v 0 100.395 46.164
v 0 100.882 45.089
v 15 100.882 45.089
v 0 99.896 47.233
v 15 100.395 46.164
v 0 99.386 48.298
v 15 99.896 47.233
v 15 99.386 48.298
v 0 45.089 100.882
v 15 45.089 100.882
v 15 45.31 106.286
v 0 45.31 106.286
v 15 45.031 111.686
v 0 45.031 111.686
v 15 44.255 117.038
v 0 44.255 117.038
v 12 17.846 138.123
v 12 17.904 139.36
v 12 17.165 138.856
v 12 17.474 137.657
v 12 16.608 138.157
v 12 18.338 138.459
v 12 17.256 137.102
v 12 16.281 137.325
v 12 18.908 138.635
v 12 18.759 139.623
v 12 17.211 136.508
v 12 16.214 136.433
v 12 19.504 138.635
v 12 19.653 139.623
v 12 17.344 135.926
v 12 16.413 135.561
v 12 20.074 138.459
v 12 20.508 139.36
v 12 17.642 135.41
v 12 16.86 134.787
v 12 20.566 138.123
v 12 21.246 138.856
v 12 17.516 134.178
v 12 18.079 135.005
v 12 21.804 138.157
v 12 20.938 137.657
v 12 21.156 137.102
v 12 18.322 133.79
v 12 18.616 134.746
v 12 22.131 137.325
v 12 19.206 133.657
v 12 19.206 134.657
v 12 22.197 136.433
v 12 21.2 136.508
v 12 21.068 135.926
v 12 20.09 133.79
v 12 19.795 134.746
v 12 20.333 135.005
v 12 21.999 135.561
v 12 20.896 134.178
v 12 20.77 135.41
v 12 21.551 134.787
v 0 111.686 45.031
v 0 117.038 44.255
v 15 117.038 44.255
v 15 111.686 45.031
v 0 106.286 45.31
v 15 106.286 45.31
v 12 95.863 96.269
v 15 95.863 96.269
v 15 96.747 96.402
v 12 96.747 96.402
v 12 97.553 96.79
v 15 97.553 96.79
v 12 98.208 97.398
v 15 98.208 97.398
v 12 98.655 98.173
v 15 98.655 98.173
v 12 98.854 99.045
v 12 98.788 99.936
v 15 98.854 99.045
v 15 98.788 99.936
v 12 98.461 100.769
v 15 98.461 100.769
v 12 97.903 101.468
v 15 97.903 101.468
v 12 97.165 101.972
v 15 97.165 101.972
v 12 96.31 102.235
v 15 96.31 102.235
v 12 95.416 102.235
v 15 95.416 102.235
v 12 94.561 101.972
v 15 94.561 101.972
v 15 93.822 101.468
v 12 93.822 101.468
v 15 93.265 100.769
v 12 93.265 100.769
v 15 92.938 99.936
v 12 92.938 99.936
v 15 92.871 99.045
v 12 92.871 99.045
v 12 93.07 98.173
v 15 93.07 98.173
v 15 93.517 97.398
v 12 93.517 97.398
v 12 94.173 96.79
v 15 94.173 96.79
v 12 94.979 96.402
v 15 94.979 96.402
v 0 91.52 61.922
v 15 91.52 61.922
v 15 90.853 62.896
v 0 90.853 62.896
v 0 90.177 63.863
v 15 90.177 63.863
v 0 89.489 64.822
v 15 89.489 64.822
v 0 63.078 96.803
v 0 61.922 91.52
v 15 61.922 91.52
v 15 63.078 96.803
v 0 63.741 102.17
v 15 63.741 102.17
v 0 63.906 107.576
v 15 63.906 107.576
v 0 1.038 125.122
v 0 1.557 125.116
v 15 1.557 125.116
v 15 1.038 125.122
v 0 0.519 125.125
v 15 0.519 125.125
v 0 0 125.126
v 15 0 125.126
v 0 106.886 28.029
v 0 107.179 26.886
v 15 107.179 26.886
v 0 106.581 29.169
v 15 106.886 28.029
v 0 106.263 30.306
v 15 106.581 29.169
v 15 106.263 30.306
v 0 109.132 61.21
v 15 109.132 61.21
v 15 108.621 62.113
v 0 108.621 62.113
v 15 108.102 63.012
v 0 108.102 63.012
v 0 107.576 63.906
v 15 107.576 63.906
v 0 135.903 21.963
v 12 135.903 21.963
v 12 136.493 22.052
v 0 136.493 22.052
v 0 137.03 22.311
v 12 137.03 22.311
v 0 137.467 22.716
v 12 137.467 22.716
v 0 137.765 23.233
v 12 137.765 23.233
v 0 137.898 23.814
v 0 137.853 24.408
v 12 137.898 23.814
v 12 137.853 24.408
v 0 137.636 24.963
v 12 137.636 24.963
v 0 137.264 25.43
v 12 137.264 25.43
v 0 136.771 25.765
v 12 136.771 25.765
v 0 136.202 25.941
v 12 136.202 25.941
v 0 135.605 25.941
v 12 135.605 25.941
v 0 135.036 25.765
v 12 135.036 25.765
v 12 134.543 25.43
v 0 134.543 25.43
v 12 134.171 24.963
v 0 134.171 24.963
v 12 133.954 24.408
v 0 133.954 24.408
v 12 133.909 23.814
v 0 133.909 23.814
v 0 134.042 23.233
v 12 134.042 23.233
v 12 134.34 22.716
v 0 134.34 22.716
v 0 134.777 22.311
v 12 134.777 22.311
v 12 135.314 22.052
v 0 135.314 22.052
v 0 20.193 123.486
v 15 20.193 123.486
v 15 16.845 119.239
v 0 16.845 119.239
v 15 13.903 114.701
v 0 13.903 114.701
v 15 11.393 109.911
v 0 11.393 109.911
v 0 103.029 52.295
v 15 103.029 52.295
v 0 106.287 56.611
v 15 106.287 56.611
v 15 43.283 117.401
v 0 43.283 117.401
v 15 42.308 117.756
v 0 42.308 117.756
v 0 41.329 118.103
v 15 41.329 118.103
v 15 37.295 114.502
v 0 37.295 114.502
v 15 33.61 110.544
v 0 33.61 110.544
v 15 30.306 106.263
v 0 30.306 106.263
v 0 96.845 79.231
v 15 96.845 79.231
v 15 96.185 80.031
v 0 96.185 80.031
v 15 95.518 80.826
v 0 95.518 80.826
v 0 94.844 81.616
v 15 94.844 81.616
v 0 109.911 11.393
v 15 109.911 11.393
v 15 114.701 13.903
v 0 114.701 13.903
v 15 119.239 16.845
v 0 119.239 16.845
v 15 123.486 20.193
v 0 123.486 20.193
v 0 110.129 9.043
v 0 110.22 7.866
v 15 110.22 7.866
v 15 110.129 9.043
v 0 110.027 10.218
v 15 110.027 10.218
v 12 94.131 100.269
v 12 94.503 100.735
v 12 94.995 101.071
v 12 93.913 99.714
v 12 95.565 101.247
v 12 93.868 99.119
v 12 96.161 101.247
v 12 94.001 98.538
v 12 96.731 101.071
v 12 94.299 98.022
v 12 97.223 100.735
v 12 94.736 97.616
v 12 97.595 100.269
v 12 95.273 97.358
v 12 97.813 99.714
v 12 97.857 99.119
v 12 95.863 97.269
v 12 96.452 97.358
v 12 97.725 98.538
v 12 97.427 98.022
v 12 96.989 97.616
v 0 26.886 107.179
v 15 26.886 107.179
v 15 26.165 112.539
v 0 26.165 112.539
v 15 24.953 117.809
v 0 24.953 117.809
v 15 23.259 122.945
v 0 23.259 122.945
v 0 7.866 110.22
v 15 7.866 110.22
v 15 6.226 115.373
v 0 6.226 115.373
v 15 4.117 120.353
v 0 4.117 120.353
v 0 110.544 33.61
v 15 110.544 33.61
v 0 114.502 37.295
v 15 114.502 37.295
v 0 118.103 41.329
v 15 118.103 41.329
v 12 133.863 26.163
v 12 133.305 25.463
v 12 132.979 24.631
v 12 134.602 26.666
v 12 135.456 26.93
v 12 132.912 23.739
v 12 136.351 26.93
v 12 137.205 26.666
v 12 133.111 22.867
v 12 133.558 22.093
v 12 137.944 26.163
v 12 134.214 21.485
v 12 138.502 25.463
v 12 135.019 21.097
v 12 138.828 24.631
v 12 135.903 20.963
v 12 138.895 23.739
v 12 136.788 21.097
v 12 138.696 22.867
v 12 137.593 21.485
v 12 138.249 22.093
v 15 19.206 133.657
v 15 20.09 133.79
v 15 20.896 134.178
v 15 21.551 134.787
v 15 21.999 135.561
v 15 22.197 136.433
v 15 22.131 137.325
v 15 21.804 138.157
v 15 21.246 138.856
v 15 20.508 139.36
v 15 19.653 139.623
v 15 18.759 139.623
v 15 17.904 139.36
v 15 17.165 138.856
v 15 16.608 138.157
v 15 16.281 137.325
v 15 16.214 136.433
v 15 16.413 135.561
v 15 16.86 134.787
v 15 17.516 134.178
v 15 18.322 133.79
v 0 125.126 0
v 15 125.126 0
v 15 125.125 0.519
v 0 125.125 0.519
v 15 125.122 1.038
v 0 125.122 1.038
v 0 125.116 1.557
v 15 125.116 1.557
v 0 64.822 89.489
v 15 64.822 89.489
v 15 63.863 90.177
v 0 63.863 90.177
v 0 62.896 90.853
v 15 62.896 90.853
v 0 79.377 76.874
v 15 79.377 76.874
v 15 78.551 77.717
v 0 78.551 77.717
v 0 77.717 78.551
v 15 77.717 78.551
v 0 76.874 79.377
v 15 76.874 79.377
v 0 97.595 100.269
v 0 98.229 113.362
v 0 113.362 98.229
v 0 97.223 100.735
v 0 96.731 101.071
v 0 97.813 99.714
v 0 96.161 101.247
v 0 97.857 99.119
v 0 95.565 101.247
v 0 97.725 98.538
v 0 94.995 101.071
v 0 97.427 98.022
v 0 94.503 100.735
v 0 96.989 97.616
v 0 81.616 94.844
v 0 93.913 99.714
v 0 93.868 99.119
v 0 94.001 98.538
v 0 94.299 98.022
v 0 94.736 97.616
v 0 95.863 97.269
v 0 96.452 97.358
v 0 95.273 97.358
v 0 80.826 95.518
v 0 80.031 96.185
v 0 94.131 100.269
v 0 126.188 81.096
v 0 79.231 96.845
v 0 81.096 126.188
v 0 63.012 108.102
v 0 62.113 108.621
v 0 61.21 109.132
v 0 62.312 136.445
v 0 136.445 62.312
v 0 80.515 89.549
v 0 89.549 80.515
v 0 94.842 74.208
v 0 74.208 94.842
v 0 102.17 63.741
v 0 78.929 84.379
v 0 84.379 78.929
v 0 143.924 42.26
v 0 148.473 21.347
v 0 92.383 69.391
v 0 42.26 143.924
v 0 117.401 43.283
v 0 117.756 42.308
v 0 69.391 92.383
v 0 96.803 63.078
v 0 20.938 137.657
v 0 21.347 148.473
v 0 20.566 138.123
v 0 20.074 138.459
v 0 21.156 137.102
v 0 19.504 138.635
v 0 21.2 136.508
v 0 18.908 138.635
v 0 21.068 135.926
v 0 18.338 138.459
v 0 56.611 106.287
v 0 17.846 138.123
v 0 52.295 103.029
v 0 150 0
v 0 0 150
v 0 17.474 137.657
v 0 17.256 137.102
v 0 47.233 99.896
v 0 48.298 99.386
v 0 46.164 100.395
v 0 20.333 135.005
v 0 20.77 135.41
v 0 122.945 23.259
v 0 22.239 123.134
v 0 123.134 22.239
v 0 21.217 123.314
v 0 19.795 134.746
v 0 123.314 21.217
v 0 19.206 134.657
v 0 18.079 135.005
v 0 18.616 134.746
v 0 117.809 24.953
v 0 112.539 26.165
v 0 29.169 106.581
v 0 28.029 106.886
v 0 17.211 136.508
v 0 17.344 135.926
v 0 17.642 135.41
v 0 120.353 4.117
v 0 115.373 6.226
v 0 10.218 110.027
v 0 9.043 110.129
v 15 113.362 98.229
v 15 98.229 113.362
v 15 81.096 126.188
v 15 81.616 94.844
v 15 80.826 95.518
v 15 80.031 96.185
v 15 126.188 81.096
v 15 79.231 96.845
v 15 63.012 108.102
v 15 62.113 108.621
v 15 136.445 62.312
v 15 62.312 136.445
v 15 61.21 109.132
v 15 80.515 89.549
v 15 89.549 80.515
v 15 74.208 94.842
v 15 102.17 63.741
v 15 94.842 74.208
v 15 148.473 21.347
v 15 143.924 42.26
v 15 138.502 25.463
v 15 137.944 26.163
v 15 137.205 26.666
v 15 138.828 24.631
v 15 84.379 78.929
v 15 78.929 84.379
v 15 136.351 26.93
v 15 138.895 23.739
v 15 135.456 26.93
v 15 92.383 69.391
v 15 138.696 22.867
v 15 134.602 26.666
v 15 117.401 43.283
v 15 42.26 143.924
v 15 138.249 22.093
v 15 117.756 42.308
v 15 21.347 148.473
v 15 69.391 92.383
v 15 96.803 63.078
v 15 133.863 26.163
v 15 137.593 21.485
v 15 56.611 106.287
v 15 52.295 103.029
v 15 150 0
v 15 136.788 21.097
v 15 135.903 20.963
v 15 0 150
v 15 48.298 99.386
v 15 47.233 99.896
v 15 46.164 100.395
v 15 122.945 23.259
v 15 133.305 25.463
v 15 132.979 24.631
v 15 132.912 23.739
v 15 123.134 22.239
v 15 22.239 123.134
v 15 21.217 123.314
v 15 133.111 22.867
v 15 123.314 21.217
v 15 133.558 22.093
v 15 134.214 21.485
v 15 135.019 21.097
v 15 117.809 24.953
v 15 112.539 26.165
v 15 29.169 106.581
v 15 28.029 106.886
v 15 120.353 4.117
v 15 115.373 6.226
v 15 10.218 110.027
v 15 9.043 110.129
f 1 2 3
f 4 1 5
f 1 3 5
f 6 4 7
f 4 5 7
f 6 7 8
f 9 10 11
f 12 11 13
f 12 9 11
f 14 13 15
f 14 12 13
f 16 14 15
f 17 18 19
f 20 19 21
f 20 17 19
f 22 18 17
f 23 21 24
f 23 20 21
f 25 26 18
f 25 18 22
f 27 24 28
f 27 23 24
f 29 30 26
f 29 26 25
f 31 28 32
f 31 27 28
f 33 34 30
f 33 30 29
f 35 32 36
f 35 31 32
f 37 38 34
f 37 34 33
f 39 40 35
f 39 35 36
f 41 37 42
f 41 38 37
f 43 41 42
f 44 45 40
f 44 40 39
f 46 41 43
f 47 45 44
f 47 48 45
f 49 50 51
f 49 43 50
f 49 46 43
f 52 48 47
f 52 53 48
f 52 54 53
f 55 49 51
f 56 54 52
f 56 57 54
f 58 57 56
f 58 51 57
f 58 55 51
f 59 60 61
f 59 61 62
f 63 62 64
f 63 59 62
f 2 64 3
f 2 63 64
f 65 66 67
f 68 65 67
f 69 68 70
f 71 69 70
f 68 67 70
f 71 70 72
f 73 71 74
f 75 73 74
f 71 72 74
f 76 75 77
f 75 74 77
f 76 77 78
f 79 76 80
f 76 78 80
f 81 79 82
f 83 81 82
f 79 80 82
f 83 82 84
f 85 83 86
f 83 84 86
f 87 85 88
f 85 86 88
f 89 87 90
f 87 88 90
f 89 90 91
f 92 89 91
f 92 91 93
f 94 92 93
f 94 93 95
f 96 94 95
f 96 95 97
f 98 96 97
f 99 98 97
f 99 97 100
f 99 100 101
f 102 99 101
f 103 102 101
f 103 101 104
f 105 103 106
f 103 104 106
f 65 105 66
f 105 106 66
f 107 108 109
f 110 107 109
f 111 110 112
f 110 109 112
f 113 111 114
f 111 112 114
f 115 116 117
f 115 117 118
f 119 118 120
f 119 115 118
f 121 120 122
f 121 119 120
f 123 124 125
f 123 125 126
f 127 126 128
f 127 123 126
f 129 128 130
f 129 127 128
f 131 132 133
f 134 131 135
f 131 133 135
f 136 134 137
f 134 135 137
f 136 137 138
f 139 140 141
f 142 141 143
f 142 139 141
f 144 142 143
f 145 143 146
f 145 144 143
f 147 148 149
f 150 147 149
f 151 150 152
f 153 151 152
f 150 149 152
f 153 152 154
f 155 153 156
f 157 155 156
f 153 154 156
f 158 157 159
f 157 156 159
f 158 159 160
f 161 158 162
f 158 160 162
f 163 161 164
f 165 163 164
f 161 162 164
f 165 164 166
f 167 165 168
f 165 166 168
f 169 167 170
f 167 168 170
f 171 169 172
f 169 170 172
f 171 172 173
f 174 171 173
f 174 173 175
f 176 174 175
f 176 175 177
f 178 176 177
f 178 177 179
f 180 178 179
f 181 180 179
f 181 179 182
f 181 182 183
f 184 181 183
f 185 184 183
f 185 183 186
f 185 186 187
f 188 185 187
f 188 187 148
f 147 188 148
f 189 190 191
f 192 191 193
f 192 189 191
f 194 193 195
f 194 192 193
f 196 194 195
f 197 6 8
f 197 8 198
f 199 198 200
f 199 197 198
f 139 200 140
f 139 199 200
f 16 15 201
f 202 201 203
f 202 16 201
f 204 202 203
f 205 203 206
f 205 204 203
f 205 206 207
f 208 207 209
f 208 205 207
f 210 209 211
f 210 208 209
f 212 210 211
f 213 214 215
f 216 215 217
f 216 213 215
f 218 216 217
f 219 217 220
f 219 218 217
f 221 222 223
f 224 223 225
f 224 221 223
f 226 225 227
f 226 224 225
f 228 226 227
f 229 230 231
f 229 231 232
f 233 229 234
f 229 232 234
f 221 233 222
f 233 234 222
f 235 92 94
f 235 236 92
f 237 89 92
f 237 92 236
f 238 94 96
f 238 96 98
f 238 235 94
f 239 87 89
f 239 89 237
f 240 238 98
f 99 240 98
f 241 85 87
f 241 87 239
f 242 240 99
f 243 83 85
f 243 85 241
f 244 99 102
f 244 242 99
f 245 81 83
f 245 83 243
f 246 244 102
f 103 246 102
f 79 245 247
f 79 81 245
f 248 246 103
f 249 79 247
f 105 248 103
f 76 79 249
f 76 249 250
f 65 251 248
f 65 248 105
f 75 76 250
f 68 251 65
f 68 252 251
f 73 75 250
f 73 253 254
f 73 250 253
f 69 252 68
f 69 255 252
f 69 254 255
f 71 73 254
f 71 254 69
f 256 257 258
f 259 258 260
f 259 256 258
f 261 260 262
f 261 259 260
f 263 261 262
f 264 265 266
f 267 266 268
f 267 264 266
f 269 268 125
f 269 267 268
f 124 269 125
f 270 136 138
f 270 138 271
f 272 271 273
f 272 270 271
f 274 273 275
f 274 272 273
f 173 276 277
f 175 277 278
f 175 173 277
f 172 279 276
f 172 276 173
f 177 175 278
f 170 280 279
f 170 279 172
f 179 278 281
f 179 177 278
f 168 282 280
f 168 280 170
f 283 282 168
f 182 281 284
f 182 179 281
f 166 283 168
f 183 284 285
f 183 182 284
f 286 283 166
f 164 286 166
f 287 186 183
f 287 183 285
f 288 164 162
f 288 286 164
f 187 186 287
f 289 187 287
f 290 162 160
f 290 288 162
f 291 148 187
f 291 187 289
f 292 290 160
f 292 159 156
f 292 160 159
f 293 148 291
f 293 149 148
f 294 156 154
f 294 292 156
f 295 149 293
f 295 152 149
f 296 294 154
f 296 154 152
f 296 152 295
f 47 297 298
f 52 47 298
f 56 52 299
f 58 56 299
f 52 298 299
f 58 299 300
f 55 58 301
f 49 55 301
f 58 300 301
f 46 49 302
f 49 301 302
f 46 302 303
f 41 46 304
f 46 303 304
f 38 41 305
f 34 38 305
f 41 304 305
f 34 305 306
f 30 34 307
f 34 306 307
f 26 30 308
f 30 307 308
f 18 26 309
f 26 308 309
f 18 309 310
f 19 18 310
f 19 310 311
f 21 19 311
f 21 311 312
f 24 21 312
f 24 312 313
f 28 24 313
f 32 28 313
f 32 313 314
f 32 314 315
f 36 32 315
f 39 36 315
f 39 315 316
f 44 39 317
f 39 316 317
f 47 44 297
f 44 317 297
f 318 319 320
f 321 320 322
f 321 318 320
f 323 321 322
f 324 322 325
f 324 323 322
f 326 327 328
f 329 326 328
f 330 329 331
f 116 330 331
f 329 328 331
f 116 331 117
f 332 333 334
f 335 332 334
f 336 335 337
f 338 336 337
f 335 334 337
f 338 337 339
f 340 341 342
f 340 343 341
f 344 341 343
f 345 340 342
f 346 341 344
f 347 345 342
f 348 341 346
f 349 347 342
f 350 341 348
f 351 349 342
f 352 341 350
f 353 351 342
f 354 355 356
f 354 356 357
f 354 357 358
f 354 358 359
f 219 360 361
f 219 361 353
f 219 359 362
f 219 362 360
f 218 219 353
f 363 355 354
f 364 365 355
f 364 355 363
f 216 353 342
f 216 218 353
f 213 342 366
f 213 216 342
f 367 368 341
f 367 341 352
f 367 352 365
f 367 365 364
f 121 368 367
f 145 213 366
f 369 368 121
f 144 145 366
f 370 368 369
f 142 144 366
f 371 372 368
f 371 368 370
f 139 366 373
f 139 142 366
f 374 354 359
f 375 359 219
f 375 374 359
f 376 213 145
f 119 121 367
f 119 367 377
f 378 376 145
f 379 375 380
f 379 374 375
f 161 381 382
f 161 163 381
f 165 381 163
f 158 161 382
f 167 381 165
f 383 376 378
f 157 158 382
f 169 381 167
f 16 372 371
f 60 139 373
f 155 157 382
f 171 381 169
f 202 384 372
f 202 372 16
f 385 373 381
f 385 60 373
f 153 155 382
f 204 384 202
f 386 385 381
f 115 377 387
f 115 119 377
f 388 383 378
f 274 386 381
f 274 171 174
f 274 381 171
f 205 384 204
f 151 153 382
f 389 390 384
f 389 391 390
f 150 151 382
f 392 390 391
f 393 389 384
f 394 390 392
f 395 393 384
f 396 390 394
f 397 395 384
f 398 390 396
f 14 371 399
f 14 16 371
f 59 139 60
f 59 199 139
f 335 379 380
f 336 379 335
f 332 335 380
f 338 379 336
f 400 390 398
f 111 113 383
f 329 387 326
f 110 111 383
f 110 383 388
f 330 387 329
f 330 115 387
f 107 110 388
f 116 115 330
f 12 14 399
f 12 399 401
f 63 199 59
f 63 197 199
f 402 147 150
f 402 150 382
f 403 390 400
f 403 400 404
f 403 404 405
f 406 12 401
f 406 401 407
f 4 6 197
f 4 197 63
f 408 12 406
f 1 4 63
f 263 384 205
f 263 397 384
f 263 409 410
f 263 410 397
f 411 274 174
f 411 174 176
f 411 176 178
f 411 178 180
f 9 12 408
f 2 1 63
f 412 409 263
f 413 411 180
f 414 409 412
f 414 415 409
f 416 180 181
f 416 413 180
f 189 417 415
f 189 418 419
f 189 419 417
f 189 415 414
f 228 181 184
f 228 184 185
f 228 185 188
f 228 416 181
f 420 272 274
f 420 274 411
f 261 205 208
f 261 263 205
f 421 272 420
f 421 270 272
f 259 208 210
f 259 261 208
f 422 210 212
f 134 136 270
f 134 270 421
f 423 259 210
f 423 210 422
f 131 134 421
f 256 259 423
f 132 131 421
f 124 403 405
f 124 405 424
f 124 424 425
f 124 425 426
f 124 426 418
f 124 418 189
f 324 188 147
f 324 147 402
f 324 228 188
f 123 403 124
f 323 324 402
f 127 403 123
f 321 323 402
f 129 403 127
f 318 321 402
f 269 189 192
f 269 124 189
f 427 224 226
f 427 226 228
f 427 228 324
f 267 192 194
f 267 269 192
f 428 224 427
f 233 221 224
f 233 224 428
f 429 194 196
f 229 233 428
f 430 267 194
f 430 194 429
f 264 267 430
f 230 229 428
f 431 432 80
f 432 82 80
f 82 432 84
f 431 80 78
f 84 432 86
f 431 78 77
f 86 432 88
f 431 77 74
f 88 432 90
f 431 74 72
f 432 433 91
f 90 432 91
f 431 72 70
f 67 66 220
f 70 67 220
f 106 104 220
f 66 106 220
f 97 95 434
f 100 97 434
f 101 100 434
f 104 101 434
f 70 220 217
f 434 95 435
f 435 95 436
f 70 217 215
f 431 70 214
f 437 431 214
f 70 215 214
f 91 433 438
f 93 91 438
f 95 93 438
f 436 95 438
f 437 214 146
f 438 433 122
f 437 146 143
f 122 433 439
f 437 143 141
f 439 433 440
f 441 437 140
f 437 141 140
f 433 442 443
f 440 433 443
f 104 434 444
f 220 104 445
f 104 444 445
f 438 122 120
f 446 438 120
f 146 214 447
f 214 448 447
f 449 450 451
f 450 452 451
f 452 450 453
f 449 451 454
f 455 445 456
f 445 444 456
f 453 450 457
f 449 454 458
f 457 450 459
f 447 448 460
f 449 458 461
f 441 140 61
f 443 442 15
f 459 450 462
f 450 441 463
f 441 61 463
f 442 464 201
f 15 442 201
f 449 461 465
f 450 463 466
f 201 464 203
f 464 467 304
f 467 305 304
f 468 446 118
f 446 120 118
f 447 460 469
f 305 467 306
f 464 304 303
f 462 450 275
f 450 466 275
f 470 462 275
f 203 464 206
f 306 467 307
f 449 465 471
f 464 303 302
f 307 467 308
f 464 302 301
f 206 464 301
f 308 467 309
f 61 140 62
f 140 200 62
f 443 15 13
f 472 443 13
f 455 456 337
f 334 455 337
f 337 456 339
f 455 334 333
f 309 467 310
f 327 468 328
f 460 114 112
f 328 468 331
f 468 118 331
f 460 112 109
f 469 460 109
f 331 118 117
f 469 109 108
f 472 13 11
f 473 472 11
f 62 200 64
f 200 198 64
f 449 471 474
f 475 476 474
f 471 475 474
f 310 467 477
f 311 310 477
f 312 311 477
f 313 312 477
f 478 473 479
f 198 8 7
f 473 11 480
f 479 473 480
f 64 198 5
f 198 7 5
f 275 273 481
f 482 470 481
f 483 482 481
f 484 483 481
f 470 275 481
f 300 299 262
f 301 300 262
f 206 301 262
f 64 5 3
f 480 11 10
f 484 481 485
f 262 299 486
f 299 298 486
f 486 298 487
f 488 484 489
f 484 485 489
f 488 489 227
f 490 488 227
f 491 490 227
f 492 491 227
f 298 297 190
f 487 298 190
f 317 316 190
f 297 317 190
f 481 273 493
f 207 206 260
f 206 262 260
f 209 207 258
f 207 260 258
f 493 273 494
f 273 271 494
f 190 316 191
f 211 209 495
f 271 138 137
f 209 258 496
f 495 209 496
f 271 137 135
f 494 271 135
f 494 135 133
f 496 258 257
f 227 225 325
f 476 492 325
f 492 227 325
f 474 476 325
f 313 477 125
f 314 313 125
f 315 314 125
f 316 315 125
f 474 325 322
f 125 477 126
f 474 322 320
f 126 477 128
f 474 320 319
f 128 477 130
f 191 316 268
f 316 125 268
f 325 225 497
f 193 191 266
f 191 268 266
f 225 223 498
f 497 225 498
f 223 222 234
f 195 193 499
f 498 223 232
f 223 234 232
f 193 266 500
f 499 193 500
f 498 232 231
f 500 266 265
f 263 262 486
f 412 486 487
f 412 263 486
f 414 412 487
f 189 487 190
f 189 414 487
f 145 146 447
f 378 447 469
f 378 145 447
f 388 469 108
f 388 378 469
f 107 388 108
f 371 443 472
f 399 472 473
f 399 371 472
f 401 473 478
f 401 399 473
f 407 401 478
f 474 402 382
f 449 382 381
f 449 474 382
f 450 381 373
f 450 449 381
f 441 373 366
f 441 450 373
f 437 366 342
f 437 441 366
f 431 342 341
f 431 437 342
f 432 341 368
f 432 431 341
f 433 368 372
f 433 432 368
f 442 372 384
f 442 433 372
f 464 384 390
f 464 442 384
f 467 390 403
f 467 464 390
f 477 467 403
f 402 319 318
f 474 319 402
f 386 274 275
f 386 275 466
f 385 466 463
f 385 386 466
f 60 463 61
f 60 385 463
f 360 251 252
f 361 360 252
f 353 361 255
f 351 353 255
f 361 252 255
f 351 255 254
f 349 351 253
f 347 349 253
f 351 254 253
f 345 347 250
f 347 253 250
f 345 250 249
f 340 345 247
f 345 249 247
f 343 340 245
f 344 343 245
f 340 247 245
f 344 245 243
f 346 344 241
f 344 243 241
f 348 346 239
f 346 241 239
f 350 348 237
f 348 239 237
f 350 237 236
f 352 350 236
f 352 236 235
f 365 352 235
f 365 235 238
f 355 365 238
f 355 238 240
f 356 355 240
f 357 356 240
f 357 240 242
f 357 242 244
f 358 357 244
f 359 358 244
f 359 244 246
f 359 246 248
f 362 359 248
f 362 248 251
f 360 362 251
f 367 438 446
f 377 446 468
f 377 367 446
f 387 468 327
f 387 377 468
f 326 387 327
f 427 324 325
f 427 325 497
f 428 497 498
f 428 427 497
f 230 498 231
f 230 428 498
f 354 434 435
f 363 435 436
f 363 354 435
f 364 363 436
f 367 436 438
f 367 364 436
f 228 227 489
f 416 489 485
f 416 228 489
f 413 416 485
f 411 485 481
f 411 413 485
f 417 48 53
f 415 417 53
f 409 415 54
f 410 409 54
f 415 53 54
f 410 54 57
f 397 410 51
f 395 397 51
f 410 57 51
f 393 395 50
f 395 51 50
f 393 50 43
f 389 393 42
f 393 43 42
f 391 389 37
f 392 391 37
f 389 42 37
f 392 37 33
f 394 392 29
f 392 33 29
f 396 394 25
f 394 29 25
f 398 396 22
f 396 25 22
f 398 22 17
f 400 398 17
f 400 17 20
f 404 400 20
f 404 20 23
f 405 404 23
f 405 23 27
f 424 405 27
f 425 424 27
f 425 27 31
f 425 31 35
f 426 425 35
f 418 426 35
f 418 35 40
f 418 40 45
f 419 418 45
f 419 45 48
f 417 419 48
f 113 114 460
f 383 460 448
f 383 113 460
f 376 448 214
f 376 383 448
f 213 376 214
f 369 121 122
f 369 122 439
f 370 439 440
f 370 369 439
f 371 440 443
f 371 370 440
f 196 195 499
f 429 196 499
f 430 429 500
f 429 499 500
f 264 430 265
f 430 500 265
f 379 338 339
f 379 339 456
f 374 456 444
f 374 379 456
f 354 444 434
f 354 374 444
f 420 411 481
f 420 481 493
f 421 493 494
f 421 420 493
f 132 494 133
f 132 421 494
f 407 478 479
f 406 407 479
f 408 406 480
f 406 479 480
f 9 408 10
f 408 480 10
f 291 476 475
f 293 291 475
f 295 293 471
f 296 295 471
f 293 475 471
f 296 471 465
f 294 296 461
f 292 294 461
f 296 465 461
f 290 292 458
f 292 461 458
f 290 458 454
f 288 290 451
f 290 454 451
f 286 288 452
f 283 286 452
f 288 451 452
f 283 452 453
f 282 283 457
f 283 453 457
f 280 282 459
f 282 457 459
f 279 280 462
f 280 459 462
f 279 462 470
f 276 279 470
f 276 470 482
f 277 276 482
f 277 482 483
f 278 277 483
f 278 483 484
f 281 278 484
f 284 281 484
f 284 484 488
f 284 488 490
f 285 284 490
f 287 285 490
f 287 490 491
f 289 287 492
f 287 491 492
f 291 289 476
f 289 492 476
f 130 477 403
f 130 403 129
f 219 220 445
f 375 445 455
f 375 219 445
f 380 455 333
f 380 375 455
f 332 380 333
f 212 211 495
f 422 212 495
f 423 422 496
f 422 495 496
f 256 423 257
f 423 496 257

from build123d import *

# Parameters (mm, degrees)
BASPROSKE_W           = 15
BASPROSKE_H           = 39.5
TOOTHCUT_DEPTH        = 213.661703181
TEETHCUTS_COUNT       = 36
TEETHCUTS_ANGLE       = 350
CROQUIS1_OUTSIDE_W    = 386.906
CROQUIS1_OUTSIDE_H    = 386.906
CROQUIS1_OUTSIDE_W_2  = 205.376556513
CROQUIS1_OUTSIDE_H_2  = 174.679952659
CORTAR_EXTRUIR1_DEPTH = 213.661703181
CROQUIS2_R            = 2
CORTAR_EXTRUIR2_DEPTH = 213.661703181
CROQUIS2_3_R          = 3
CROQUIS2_3_R_2        = 2
CORTAR_EXTRUIR3_DEPTH = 3


with BuildPart() as part:
    # BasProSke → Base-Revolve (revolve)
    with BuildSketch(Plane(origin=(0, 0, 0), x_dir=(1, 0, 0), z_dir=(0, 1, 0))):
        with Locations((7.5, 130.25)):
            Rectangle(BASPROSKE_W, BASPROSKE_H)
    revolve(axis=Axis((-10, 0, 0), (1, 0, 0)))

    # TooCutSke → ToothCut (cut, through all)
    with BuildSketch(Plane(origin=(0, 0, 0), x_dir=(0, 0, -1), z_dir=(1, 0, 0))):
        with BuildLine():
            ThreePointArc((7.872935628, 110.193711843), (5.234019781, 117.874768587), (1.556724153, 125.116315826))
            ThreePointArc((1.556724153, 125.116315826), (0, 125.126), (-1.556724153, 125.116315826))
            ThreePointArc((-1.556724153, 125.116315826), (-5.234019781, 117.874768587), (-7.872935628, 110.193711843))
            ThreePointArc((-7.872935628, 110.193711843), (0, 110.4746), (7.872935628, 110.193711843))
        make_face()
    toothcut = extrude(amount=TOOTHCUT_DEPTH, mode=Mode.SUBTRACT)

    # TeethCuts: ToothCut ×36 about axis
    teethcuts_axis = Axis((-10, 0, 0), (1, 0, 0))
    for i in range(1, TEETHCUTS_COUNT):
        add(toothcut.rotate(teethcuts_axis, i * TEETHCUTS_ANGLE / (TEETHCUTS_COUNT - 1)), mode=Mode.SUBTRACT)

    # Croquis1 outside → Cortar-Extruir1 (cut, through all)
    with BuildSketch(Plane(origin=(15, 0, 0), x_dir=(0, 0, -1), z_dir=(1, 0, 0))):
        Rectangle(CROQUIS1_OUTSIDE_W, CROQUIS1_OUTSIDE_H)
        with Locations((-102.688278257, 87.33997633)):
            Rectangle(CROQUIS1_OUTSIDE_W_2, CROQUIS1_OUTSIDE_H_2, mode=Mode.SUBTRACT)
    extrude(amount=-CORTAR_EXTRUIR1_DEPTH, mode=Mode.SUBTRACT)

    # Croquis2 → Cortar-Extruir2 (cut, through all)
    with BuildSketch(Plane(origin=(15, 0, 0), x_dir=(0, 0, -1), z_dir=(1, 0, 0))):
        with Locations((-23.963448518, 135.903469916)):
            Circle(CROQUIS2_R)
        with Locations((-99.268892447, 95.862855123)):
            Circle(CROQUIS2_R)
        with Locations((-136.656993486, 19.205887932)):
            Circle(CROQUIS2_R)
    extrude(amount=-CORTAR_EXTRUIR2_DEPTH, mode=Mode.SUBTRACT)

    # Croquis2<3> → Cortar-Extruir3 (cut)
    # profile 1 of 3: a face of its own
    with BuildSketch(Plane(origin=(15, 0, 0), x_dir=(0, 0, -1), z_dir=(1, 0, 0))):
        with Locations((-23.963448518, 135.903469916)):
            Circle(CROQUIS2_3_R)
        with Locations((-23.963448518, 135.903469916)):
            Circle(CROQUIS2_3_R_2, mode=Mode.SUBTRACT)
    # profile 2 of 3: a face of its own
    with BuildSketch(Plane(origin=(15, 0, 0), x_dir=(0, 0, -1), z_dir=(1, 0, 0))):
        with Locations((-99.268892447, 95.862855123)):
            Circle(CROQUIS2_3_R)
        with Locations((-99.268892447, 95.862855123)):
            Circle(CROQUIS2_3_R_2, mode=Mode.SUBTRACT)
    # profile 3 of 3: a face of its own
    with BuildSketch(Plane(origin=(15, 0, 0), x_dir=(0, 0, -1), z_dir=(1, 0, 0))):
        with Locations((-136.656993486, 19.205887932)):
            Circle(CROQUIS2_3_R)
        with Locations((-136.656993486, 19.205887932)):
            Circle(CROQUIS2_3_R_2, mode=Mode.SUBTRACT)
    extrude(amount=-CORTAR_EXTRUIR3_DEPTH, mode=Mode.SUBTRACT)


solid = part.part
